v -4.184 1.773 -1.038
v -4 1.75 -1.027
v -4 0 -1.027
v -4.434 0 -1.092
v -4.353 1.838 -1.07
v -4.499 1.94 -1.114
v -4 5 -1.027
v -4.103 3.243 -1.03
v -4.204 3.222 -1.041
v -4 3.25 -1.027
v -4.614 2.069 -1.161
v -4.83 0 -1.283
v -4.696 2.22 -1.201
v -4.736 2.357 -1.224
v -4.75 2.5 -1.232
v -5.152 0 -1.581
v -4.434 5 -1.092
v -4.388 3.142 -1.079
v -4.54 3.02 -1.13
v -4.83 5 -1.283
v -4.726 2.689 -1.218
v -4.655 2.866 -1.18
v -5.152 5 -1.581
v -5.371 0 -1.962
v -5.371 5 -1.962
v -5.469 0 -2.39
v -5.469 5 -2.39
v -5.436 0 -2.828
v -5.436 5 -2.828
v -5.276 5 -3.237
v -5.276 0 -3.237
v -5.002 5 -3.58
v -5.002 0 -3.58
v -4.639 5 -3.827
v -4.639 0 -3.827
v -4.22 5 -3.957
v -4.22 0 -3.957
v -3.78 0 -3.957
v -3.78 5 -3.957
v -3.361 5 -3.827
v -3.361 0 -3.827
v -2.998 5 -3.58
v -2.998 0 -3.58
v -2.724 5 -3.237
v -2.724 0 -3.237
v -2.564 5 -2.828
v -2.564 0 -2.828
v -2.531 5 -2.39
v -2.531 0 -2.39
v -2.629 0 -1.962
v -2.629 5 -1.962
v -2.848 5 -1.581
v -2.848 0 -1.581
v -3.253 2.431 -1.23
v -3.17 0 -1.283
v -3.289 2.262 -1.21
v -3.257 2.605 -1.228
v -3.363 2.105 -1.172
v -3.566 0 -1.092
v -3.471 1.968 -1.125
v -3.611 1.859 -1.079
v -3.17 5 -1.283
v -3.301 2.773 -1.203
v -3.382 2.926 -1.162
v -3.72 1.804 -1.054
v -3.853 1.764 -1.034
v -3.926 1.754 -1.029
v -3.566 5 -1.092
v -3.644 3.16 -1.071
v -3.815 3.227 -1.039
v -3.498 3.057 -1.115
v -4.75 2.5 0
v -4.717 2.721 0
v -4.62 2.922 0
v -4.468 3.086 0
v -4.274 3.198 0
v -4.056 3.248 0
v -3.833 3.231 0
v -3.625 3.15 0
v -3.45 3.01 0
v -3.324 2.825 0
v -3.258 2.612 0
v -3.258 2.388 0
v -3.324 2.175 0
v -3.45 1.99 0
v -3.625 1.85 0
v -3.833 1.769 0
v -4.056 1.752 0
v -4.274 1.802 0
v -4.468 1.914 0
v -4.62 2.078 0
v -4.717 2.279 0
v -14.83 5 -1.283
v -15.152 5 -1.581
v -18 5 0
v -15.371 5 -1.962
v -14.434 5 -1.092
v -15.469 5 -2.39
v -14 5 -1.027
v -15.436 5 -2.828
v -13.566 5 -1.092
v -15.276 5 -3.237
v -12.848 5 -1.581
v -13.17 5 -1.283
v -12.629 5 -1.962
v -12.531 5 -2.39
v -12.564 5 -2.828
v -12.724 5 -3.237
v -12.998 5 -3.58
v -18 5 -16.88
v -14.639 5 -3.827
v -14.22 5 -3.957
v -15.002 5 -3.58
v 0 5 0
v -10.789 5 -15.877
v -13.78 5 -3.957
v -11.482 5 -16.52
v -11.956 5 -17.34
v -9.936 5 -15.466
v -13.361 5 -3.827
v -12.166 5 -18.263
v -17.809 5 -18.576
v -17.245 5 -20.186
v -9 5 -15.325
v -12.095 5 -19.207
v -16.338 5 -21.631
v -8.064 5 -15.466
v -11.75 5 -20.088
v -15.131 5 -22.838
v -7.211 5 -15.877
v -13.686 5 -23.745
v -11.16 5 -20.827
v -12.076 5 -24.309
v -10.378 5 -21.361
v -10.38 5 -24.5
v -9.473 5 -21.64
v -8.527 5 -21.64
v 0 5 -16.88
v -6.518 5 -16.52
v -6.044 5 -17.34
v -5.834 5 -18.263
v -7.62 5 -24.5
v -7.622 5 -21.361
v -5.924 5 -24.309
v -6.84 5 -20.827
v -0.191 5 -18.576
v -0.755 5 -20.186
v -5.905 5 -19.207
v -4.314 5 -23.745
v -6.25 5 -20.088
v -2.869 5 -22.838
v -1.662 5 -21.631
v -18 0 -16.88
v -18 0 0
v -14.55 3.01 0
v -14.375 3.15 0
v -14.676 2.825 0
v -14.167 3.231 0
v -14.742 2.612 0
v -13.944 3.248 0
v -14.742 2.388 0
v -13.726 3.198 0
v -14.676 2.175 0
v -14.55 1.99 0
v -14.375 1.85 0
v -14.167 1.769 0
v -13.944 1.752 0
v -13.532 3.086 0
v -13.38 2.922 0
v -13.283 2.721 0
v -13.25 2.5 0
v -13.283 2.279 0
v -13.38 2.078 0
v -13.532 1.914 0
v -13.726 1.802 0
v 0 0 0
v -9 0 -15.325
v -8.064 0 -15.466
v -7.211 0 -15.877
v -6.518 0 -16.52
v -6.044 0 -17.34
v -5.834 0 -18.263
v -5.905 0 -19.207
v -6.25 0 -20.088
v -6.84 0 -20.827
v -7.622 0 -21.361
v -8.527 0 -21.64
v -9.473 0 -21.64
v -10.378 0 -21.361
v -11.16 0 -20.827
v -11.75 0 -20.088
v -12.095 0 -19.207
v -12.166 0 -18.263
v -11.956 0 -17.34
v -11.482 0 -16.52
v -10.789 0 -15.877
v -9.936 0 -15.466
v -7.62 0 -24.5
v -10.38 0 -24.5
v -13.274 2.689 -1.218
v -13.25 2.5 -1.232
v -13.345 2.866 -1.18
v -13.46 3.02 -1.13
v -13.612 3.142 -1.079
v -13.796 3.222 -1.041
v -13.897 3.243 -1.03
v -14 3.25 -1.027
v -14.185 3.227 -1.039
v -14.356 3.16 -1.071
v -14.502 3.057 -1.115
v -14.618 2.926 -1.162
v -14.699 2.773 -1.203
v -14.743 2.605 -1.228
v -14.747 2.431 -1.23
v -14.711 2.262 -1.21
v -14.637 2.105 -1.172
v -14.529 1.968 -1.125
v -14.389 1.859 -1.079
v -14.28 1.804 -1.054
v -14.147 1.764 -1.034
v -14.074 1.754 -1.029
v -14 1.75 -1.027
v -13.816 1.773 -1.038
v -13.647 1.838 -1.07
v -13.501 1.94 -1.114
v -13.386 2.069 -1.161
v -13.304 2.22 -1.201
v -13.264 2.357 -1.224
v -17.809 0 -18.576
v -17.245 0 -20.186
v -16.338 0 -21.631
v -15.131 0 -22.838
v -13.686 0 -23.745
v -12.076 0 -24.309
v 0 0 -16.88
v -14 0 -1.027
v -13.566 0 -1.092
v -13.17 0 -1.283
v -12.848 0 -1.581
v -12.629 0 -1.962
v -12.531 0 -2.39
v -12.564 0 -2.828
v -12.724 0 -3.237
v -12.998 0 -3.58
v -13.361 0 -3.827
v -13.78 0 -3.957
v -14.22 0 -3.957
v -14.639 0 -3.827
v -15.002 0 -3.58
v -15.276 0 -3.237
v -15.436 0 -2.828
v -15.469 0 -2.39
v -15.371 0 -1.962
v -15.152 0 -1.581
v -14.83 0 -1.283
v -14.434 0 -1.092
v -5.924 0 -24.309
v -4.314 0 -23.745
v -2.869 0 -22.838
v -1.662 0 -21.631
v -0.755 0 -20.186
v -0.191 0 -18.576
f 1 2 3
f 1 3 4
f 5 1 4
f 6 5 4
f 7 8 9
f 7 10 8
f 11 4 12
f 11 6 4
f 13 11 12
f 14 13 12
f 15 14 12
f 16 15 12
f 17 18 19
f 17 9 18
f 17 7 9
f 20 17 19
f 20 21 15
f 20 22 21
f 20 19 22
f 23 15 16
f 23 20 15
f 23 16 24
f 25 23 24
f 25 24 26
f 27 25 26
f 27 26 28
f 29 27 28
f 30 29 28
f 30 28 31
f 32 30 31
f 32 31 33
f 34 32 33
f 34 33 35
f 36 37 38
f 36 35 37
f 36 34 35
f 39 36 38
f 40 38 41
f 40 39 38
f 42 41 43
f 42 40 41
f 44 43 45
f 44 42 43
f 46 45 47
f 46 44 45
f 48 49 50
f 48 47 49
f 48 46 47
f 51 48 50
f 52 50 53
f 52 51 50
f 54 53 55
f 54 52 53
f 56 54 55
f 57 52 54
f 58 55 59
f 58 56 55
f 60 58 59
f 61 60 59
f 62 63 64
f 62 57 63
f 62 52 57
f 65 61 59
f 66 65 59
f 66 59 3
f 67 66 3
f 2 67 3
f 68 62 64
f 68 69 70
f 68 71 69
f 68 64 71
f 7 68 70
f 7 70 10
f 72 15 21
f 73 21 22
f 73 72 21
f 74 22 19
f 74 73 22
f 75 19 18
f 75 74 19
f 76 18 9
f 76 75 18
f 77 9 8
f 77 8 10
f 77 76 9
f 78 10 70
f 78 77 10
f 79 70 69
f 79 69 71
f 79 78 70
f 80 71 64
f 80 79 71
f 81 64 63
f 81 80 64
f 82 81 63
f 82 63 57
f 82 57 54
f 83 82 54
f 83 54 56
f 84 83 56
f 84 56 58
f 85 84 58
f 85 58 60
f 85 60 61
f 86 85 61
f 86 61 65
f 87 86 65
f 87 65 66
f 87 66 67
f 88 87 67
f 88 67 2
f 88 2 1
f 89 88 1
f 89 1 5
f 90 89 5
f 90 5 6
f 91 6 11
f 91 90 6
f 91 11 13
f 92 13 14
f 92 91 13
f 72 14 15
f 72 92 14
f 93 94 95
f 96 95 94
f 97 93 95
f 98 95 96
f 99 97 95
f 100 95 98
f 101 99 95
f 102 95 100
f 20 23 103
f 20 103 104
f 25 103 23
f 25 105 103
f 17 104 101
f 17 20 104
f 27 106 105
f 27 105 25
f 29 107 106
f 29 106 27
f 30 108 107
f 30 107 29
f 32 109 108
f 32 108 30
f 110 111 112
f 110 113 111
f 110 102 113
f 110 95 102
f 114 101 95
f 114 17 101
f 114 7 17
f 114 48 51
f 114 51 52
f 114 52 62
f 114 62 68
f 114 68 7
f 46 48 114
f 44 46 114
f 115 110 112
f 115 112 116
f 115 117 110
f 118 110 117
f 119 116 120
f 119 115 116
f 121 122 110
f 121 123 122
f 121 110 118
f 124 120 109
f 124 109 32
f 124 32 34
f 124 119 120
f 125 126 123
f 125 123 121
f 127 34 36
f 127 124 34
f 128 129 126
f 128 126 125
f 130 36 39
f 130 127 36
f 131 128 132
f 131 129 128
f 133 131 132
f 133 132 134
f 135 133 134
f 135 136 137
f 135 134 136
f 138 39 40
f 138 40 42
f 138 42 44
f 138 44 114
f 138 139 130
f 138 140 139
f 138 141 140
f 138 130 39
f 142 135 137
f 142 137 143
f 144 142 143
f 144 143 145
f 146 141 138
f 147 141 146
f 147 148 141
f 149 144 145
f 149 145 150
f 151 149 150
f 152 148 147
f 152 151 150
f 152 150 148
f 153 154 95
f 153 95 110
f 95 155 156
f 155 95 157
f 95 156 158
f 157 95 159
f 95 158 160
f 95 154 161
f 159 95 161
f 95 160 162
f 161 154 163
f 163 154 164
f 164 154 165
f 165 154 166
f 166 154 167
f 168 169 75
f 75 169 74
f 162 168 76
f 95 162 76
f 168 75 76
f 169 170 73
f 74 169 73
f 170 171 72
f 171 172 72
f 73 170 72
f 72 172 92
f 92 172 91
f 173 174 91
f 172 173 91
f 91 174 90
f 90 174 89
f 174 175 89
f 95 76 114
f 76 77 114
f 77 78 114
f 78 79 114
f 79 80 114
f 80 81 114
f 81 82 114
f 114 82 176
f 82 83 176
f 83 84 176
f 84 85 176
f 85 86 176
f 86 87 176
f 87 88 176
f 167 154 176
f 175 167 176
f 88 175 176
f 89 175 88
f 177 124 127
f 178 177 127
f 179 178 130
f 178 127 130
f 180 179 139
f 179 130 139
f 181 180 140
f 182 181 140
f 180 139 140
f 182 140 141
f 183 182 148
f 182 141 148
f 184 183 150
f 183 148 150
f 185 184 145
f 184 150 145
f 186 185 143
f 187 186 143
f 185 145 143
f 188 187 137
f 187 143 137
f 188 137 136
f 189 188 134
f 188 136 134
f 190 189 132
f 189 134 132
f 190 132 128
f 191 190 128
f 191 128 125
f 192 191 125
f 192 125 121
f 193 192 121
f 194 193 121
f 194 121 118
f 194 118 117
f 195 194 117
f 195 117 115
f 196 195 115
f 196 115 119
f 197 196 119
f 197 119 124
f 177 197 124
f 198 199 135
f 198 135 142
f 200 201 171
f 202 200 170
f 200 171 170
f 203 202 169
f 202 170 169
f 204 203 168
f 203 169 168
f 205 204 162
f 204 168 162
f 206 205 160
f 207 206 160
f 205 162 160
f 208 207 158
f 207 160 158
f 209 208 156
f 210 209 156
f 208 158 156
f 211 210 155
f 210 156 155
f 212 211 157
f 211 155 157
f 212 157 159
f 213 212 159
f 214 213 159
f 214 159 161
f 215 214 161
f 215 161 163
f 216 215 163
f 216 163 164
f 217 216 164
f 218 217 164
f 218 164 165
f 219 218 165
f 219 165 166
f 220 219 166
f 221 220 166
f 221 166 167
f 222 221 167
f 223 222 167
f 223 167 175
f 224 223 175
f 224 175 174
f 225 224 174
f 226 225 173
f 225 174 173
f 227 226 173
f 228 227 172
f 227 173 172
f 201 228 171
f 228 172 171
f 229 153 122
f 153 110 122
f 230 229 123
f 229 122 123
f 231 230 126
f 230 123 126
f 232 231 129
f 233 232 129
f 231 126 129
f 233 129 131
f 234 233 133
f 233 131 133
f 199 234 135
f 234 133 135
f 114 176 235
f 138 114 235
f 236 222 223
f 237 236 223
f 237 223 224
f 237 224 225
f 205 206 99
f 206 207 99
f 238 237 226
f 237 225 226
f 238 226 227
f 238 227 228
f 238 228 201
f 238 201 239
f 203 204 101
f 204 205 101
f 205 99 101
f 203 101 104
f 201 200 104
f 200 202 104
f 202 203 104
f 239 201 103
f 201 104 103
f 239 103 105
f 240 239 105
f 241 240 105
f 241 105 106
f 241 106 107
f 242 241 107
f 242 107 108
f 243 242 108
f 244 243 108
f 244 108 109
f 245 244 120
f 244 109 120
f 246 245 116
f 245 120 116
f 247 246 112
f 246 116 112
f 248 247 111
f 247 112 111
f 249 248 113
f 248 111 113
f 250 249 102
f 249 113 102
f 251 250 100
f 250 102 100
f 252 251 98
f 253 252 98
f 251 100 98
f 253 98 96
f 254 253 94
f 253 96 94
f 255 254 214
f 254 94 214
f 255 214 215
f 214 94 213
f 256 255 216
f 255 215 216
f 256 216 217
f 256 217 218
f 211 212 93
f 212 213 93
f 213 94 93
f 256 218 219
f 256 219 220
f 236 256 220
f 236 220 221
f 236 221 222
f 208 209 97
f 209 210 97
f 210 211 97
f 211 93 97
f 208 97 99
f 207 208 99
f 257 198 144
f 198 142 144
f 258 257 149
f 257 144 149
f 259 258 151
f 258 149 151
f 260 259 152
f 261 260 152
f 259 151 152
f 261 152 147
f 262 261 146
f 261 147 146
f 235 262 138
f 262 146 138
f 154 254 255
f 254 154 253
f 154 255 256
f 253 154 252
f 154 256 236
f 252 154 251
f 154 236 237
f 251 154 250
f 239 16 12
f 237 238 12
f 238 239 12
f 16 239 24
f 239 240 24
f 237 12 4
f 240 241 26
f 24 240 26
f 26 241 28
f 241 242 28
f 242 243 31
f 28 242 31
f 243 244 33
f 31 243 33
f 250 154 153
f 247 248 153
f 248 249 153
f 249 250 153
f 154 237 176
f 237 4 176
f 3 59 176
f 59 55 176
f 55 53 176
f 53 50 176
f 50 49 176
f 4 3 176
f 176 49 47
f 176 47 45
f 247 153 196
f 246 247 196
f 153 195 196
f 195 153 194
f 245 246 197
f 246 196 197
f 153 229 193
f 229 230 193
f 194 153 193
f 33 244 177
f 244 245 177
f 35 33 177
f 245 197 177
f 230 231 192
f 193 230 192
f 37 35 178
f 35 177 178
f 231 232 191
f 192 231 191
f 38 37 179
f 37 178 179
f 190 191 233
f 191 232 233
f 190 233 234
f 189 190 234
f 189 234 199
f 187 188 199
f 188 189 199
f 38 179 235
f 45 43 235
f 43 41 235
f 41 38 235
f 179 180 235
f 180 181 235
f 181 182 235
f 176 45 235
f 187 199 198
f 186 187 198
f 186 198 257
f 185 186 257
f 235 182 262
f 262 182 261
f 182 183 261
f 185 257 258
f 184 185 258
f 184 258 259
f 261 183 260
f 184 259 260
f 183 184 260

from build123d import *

# Parameters (mm, degrees)
SKETCH1_W                         = 18
SKETCH1_H                         = 24.5
EXTRUDE1_DEPTH                    = 5
SKETCH3_R                         = 1.4732
EXTRUDE2_DEPTH                    = 6
SKETCH4_R                         = 0.75
EXTRUDE3_DEPTH                    = 2.46
FILLET1_R                         = 7.62
F_1_4_20_TAPPED_HOLE1_D           = 5.1054
F_1_4_20_TAPPED_HOLE1_DEPTH       = 16.51
F_1_4_20_TAPPED_HOLE1_CBORE_D     = 6.35
F_1_4_20_TAPPED_HOLE1_CBORE_DEPTH = 12.7
F_1_4_20_TAPPED_HOLE1_TIP         = 1.533816902


with BuildPart() as part:
    # Sketch1 → Extrude1 (new body)
    with BuildSketch(Plane(origin=(0, 0, 0), x_dir=(1, 0, 0), z_dir=(0, 1, 0))):
        with Locations((-9, 12.25)):
            Rectangle(SKETCH1_W, SKETCH1_H)
    extrude(amount=EXTRUDE1_DEPTH)

    # Sketch3 → Extrude2 (cut, through all)
    with BuildSketch(Plane(origin=(0, 5, 0), x_dir=(1, 0, 0), z_dir=(0, 1, 0))):
        with Locations(Location((-14, 2.5, 0), (0, 0, 270))):  # turned: the seam where the file's is
            Circle(SKETCH3_R)
    extrude2 = extrude(amount=-EXTRUDE2_DEPTH, mode=Mode.SUBTRACT)

    # Sketch4 → Extrude3 (cut)
    with BuildSketch(Plane.XY):
        with Locations((-14, 2.5)):
            Circle(SKETCH4_R)
    extrude3 = extrude(amount=-EXTRUDE3_DEPTH, mode=Mode.SUBTRACT)

    # Mirror1: Extrude2, Extrude3 across plane
    add(extrude2.mirror(Plane(origin=(-9, 0, 0), x_dir=(0, 0, 1), z_dir=(1, 0, 0))), mode=Mode.SUBTRACT)
    add(extrude3.mirror(Plane(origin=(-9, 0, 0), x_dir=(0, 0, 1), z_dir=(1, 0, 0))), mode=Mode.SUBTRACT)

    # Fillet1
    fillet1_edges = [part.edges().sort_by_distance(p)[0] for p in [
        (-18, 2.5, -24.5),
        (0, 2.5, -24.5),
    ]]
    fillet(fillet1_edges, radius=FILLET1_R)

    # 1/4-20 Tapped Hole1
    with Locations(Plane(origin=(-9, 5, -18.5), x_dir=(0, 0, 1), z_dir=(0, 1, 0))):
        with Locations((0, 0)):
            CounterBoreHole(F_1_4_20_TAPPED_HOLE1_D / 2, F_1_4_20_TAPPED_HOLE1_CBORE_D / 2, F_1_4_20_TAPPED_HOLE1_CBORE_DEPTH, depth=F_1_4_20_TAPPED_HOLE1_DEPTH)
            with Locations((0, 0, -(F_1_4_20_TAPPED_HOLE1_DEPTH + F_1_4_20_TAPPED_HOLE1_TIP / 2))):  # 118° drill point
                Cone(0, F_1_4_20_TAPPED_HOLE1_D / 2, F_1_4_20_TAPPED_HOLE1_TIP, mode=Mode.SUBTRACT)


solid = part.part
